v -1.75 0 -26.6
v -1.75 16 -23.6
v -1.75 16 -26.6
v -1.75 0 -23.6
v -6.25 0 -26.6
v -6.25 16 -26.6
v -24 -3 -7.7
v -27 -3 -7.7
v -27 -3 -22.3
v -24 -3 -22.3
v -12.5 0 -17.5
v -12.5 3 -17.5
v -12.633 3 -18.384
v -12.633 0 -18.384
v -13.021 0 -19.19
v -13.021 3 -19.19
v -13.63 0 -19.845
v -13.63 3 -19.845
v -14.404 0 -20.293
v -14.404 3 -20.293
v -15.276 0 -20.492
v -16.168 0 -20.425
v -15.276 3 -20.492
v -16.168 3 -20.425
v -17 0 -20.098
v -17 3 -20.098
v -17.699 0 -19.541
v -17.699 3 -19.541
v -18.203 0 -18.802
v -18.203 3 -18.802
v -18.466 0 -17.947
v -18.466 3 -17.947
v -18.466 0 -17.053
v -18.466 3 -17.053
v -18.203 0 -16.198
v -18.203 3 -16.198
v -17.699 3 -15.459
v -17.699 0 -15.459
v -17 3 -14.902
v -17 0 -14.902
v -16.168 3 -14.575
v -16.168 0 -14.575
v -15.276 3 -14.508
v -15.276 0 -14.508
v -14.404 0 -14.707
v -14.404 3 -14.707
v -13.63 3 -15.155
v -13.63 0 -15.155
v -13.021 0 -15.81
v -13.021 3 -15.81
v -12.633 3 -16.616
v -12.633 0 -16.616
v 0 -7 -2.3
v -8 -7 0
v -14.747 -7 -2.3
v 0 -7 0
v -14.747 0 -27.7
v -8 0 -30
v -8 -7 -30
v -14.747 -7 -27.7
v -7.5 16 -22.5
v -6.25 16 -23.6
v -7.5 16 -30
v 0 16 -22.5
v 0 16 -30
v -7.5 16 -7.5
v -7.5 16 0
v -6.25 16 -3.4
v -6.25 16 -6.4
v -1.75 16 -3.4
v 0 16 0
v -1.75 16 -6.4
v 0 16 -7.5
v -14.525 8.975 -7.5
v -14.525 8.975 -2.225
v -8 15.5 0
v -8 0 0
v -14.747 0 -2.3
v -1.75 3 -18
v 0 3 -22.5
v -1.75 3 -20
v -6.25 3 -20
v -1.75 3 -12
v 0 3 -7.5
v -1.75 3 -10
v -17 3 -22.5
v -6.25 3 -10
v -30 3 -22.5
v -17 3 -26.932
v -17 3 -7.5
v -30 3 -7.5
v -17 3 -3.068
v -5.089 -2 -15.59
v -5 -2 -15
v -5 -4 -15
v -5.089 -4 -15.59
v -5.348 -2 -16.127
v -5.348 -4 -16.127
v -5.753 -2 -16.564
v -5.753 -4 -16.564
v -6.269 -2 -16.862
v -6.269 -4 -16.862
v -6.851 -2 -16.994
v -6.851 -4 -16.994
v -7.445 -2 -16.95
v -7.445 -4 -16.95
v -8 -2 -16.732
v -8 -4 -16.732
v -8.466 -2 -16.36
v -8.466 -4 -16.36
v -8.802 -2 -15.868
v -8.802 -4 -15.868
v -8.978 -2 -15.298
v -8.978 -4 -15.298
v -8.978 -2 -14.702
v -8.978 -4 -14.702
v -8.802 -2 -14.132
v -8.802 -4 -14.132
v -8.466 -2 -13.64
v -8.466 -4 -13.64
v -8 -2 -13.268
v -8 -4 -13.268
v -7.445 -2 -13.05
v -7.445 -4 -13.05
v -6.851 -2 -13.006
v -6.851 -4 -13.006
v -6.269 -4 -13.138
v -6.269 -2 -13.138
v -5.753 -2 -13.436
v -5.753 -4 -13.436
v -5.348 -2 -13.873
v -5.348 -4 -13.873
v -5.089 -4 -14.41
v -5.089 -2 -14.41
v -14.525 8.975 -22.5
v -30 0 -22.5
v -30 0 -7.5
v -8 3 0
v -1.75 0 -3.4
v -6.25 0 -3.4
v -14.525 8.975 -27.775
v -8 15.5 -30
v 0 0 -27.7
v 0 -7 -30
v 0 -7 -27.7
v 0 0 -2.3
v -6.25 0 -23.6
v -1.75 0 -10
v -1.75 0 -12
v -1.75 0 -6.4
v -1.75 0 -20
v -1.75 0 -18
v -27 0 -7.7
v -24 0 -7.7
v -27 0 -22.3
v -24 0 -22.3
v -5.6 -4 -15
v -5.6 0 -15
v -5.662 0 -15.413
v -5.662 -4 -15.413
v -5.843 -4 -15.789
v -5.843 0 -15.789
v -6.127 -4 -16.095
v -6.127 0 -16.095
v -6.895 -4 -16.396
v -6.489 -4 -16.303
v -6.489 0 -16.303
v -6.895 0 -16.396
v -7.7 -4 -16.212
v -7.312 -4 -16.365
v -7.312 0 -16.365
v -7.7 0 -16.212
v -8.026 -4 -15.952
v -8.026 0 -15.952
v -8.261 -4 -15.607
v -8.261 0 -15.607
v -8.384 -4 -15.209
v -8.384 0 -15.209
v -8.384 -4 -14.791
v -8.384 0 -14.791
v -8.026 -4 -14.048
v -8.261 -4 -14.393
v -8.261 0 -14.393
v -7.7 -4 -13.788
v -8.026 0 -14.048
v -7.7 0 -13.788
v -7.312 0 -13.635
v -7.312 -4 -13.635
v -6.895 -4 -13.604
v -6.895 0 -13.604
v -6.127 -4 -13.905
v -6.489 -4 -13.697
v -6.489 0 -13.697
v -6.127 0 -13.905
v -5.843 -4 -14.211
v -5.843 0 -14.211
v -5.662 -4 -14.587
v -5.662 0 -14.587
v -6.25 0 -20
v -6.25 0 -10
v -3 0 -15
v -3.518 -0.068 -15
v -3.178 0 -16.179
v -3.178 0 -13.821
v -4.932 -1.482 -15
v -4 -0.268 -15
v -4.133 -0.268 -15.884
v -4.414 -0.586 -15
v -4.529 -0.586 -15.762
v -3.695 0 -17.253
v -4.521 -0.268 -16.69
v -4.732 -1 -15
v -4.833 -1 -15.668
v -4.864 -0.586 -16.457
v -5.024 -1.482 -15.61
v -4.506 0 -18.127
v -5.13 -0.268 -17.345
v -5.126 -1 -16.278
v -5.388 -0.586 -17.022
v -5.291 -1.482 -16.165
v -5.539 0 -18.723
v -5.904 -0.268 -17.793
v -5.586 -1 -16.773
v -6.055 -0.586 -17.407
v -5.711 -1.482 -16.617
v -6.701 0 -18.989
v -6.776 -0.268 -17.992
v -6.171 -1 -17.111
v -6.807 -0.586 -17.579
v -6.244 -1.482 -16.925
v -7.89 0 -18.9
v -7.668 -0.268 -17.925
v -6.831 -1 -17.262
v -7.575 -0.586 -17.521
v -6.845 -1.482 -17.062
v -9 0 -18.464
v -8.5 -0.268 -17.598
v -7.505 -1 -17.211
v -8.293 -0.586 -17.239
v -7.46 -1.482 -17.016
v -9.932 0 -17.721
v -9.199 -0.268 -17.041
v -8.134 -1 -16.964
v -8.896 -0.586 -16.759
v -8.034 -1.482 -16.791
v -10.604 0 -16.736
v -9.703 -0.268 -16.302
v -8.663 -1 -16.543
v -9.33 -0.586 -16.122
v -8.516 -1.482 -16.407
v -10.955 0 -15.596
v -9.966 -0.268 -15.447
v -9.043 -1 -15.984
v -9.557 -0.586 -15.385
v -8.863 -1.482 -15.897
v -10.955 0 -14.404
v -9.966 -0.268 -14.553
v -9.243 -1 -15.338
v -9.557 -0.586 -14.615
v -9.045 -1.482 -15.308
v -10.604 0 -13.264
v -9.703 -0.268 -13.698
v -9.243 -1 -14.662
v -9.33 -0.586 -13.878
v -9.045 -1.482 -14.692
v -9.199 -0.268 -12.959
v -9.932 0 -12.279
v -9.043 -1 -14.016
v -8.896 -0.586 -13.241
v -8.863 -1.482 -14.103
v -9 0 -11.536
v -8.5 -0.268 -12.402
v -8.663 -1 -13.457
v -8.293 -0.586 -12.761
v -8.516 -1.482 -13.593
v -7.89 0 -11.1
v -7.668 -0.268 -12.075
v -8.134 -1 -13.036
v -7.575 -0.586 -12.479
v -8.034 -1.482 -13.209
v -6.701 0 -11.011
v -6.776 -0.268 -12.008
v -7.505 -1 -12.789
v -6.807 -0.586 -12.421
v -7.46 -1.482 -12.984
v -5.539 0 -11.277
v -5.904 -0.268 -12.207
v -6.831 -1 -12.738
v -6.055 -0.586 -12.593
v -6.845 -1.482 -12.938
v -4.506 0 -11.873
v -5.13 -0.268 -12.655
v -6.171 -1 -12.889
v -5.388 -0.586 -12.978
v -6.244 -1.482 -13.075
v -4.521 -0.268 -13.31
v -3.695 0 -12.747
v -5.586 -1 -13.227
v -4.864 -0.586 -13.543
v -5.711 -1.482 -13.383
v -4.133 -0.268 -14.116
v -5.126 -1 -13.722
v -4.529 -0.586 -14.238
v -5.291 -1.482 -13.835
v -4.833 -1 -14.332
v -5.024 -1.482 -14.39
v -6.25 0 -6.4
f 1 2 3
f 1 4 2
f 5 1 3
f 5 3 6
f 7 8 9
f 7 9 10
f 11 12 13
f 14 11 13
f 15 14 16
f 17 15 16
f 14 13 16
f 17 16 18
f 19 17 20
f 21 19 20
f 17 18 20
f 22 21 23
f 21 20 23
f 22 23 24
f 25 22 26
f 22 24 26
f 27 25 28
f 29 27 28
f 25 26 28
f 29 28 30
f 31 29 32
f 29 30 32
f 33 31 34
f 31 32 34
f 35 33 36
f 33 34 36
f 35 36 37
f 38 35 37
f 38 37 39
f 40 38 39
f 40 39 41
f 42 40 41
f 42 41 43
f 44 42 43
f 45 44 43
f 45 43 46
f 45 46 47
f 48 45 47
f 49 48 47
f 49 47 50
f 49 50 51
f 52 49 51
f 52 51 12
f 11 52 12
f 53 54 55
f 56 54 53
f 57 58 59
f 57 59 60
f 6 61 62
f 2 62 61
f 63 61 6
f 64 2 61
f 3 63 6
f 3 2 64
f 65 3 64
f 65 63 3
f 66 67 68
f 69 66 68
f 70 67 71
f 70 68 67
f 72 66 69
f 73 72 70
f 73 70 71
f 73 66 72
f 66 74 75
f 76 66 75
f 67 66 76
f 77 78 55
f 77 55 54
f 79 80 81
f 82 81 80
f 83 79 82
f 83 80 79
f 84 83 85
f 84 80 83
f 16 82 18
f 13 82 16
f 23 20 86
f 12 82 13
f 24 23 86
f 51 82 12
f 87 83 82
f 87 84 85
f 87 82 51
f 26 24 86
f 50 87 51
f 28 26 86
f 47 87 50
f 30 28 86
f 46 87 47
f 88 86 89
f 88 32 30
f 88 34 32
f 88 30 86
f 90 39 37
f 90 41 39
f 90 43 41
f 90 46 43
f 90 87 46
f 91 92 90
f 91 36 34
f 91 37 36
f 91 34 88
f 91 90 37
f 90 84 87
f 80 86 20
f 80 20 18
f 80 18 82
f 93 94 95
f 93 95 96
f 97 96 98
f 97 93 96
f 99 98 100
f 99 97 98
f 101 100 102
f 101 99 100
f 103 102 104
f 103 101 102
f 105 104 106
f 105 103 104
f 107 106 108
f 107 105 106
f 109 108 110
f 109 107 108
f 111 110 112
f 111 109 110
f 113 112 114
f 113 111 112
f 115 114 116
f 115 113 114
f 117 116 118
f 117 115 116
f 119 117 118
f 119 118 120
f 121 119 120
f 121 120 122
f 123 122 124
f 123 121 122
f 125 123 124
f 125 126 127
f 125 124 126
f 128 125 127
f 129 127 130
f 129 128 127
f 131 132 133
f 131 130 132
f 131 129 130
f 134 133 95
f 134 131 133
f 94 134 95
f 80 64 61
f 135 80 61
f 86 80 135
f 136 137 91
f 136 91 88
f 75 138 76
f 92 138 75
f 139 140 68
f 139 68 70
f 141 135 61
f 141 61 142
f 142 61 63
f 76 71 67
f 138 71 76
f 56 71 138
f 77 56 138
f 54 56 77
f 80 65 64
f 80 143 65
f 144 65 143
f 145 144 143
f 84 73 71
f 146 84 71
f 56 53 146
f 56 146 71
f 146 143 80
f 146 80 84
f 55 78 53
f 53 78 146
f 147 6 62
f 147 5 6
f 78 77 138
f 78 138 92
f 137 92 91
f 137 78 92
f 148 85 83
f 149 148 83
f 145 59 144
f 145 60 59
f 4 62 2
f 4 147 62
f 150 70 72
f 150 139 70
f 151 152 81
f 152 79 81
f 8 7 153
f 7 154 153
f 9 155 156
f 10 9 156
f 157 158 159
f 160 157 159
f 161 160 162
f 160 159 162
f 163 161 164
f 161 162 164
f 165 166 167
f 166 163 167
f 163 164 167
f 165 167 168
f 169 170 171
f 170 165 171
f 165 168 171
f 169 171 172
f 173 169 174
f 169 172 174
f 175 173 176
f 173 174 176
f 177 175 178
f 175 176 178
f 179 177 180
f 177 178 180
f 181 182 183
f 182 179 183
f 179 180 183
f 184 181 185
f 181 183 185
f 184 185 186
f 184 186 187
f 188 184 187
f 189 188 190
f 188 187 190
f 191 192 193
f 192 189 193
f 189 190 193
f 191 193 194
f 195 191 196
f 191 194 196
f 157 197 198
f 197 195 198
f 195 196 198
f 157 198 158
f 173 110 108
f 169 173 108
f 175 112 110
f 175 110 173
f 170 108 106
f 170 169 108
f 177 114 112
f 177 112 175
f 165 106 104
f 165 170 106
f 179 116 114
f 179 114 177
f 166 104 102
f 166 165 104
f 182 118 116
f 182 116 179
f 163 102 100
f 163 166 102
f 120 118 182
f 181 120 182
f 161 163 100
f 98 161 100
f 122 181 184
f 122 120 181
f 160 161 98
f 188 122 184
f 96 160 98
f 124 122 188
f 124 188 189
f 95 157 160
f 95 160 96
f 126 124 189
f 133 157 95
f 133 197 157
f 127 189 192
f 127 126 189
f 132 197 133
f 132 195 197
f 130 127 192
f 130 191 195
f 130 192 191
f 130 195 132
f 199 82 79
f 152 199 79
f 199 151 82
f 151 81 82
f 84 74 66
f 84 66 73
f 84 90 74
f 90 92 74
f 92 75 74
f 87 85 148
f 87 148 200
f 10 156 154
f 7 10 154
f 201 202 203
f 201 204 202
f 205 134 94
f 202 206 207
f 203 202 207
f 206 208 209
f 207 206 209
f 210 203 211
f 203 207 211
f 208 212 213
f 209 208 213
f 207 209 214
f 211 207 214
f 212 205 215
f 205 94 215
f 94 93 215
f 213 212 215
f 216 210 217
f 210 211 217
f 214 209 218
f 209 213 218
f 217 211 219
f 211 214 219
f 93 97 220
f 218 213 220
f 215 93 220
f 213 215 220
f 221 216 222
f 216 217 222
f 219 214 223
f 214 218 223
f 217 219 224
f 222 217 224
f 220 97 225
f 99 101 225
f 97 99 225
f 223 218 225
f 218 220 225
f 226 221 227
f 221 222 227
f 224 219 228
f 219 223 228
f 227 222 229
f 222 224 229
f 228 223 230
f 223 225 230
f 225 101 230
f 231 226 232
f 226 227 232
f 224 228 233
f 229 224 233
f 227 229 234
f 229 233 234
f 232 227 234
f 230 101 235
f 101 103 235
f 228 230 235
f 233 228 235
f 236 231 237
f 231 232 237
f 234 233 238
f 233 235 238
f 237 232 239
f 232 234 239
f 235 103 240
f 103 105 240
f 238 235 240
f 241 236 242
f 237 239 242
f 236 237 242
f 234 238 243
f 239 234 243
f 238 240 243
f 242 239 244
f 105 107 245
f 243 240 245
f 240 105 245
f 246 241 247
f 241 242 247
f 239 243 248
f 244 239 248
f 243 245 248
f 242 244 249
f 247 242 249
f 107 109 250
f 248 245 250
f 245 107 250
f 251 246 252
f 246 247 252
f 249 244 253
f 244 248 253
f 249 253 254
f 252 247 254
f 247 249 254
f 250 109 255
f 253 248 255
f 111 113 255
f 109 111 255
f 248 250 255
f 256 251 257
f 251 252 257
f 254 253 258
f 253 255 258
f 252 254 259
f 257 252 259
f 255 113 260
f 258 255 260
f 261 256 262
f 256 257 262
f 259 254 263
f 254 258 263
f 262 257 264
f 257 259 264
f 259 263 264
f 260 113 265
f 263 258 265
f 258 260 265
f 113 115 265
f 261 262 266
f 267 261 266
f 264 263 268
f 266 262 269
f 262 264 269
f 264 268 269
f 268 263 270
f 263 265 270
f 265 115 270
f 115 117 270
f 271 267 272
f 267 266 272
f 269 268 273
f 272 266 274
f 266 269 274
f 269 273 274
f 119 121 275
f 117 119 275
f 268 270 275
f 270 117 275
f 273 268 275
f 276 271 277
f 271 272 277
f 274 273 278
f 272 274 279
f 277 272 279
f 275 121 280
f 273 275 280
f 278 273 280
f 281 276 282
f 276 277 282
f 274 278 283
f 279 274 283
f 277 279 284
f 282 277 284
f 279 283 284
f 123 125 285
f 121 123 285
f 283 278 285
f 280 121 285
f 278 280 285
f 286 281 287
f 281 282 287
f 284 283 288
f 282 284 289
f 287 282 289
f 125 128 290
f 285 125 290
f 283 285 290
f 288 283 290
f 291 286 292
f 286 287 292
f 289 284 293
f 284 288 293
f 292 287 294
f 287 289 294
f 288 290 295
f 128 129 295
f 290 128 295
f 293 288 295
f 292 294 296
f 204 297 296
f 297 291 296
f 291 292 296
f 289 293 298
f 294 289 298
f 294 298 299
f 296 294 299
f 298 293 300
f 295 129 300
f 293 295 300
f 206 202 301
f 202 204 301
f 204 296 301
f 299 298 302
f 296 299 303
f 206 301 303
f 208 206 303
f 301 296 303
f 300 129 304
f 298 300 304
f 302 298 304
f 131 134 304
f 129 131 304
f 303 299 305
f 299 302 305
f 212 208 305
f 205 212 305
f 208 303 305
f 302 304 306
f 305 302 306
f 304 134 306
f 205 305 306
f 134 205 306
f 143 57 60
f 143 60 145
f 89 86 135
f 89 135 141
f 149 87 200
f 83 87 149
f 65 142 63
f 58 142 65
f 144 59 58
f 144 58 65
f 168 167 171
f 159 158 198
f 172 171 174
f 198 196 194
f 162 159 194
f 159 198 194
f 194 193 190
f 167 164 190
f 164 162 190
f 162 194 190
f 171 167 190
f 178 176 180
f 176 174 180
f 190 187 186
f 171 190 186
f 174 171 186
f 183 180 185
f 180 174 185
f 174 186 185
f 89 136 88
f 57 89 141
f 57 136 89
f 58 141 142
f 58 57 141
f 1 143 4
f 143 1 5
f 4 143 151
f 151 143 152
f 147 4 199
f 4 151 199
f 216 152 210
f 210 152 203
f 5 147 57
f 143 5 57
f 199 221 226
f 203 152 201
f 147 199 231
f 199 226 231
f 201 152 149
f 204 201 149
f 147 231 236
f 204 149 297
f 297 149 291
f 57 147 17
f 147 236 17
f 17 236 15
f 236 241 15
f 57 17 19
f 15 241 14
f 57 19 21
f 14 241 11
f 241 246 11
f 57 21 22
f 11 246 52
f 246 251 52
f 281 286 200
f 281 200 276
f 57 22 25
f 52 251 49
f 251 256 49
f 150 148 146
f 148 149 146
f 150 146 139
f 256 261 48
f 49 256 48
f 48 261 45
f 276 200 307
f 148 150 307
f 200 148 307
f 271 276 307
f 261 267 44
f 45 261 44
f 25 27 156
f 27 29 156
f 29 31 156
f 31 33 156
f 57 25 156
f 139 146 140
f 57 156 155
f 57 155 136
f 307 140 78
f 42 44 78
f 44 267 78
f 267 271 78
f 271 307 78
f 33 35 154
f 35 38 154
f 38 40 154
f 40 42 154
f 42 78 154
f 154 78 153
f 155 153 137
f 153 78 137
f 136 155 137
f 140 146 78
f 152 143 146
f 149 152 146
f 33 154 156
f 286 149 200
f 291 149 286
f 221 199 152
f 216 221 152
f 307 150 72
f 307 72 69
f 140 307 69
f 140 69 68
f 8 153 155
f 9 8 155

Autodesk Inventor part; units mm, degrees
ref_plane "YZ Plane" through (0, 0, 0) normal (1, 0, 0) x (0, 1, 0)
ref_plane "XZ Plane" through (0, 0, 0) normal (0, 1, 0) x (-1, 0, 0)
ref_plane "XY Plane" through (0, 0, 0) normal (0, 0, 1) x (1, 0, 0)
sketch "Sketch1" plane through (0, 0, 0) normal (0, 1, 0) x (-1, 0, 0)
  line L0 (0, 0) -> (8, 0)
  line L1 (8, -30) -> (0, -30)
  line L2 (0, -30) -> (0, 0)
  line L3 (6.25, -3.4) -> (1.75, -3.4)
  line L4 (1.75, -3.4) -> (1.75, -6.4)
  line L5 (1.75, -6.4) -> (6.25, -6.4)
  line L6 (6.25, -6.4) -> (6.25, -3.4)
  line L7 (6.25, -23.6) -> (1.75, -23.6)
  line L8 (1.75, -23.6) -> (1.75, -26.6)
  line L9 (1.75, -26.6) -> (6.25, -26.6)
  line L10 (6.25, -26.6) -> (6.25, -23.6)
  line L11 (8, 0) -> (30, -7.5)
  line L12 (30, -7.5) -> (30, -22.5)
  line L13 (30, -22.5) -> (8, -30)
  dimension "d0" = 30
  dimension "d1" = 8
  dimension "d2" = 4.5
  dimension "d3" = 3
  dimension "d4" = 3
  dimension "d5" = 17.2
  dimension "d6" = 3.4
  dimension "d7" = 1.75
  dimension "d8" = 15
  dimension "d9" = 7.5
  dimension "d10" = 22
  dimension "d11" = 22
extrude "Extrusion1" add sketch "Sketch1" along normal blind 3
sketch "Sketch2" plane through (0, 0, 0) normal (0, -1, 0) x (1, 0, 0)
  line L0 (0, -30) -> (-8, -30) projected
  line L1 (0, -30) -> (-8, -30)
  line L2 (-8, -30) -> (-14.7467, -27.7)
  line L3 (-8, -30) -> (-30, -22.5) projected
  line L4 (-14.7467, -27.7) -> (0, -27.7)
  line L5 (0, 0) -> (0, -30) projected
  line L6 (0, -27.7) -> (0, -30)
  line L7 (-14.7467, -2.3) -> (-8, 0)
  line L8 (-8, 0) -> (0, 0)
  line L9 (-14.7467, -2.3) -> (0, -2.3)
  line L10 (0, 0) -> (0, -2.3)
  dimension "d14" = 2.3
  dimension "d15" = 2.3
  dimension "d26" = 14.7467
extrude "Extrusion2" add sketch "Sketch2" along normal blind 7
sketch "Sketch3" plane through (0, 0, 0) normal (0, -1, 0) x (1, 0, 0)
  line L0 (-27, -22.3) -> (-24, -22.3)
  line L1 (-24, -22.3) -> (-24, -7.7)
  line L2 (-24, -7.7) -> (-27, -7.7)
  line L3 (-27, -7.7) -> (-27, -22.3)
  line L4 (0, -2.3) -> (0, -27.7) projected
  circle A0 centre (-7, -15) radius 1.4
  circle A1 centre (-7, -15) radius 2
  line L5 (-8, -30) -> (0, -30) projected
  point P0 (0, 0)
  point P1 (-30, -7.5)
  point P2 (-30, -22.5)
  dimension "d27" = 3
  dimension "d28" = 24
  dimension "d29" = 14.6
  dimension "d30" = 0.2
  dimension "d31" = 2.8
  dimension "d32" = 4
  dimension "d33" = 7
  dimension "d34" = 15
extrude "Extrusion3" add sketch "Sketch3" along normal blind 4
fillet "Fillet1" radius 2 1 edges at (-9, 0, -15)
sketch "Sketch4" plane through (0, 3, 0) normal (0, 1, 0) x (1, 0, 0)
  circle A0 centre (-7, 15) radius 2 projected
  circle A1 centre (-7, 15) radius 1.4 projected
  circle A2 centre (-7, 15) radius 4 projected
  line L0 (-1.75, 10) -> (-6.25, 10)
  line L1 (-6.25, 10) -> (-1.75, 12)
  line L2 (-1.75, 10) -> (-1.75, 12)
  line L3 (-1.75, 18) -> (-1.75, 20)
  line L4 (-1.75, 20) -> (-6.25, 20)
  line L5 (-6.25, 20) -> (-1.75, 18)
  point P0 (0, 0)
  point P1 (-6.25, 6.4)
  point P2 (-1.75, 6.4)
  point P3 (-6.25, 23.6)
  point P4 (-1.75, 23.6)
  dimension "d38" = 3
  dimension "d39" = 2
  dimension "d40" = 2
  dimension "d41" = 3
extrude "Extrusion4" cut sketch "Sketch4" against normal blind 5 contours L0 L1 L2 | L5 L4 L3
sketch "Sketch5" plane through (0, 3, 0) normal (0, 1, 0) x (1, 0, 0)
  circle A0 centre (-15.5, 17.5) radius 3
  line L0 (0, 0) -> (0, 30) projected
  point P0 (-30, 22.5)
  dimension "d44" = 6
  dimension "d45" = 15.5
  dimension "d46" = 5
extrude "Extrusion5" cut sketch "Sketch5" against normal blind 5
sketch "Sketch6" plane through (0, 3, 0) normal (0, 1, 0) x (1, 0, 0)
  line L0 (-6.25, 26.6) -> (-1.75, 26.6) projected
  line L1 (-1.75, 23.6) -> (-6.25, 23.6) projected
  line L2 (-6.25, 26.6) -> (-1.75, 26.6)
  line L3 (-1.75, 26.6) -> (-1.75, 23.6)
  line L4 (-1.75, 23.6) -> (-6.25, 23.6)
  line L5 (-6.25, 23.6) -> (-6.25, 26.6)
  line L6 (-6.25, 6.4) -> (-1.75, 6.4) projected
  line L7 (-6.25, 6.4) -> (-1.75, 6.4)
  line L8 (-1.75, 6.4) -> (-1.75, 3.4)
  line L9 (-1.75, 3.4) -> (-6.25, 3.4)
  line L10 (-6.25, 3.4) -> (-6.25, 6.4)
  line L11 (-8, 0) -> (0, 0) projected
  line L12 (0, 0) -> (-8, 0)
  line L13 (0, 0) -> (0, 30) projected
  line L14 (0, 7.5) -> (0, 0)
  line L15 (0, 30) -> (-8, 30)
  line L16 (0, 22.5) -> (0, 30)
  line L17 (-8, 30) -> (-30, 22.5) projected
  line L18 (-8, 30) -> (-17, 26.9318)
  line L19 (0, 22.5) -> (-17, 22.5)
  line L20 (-17, 26.9318) -> (-17, 22.5)
  line L21 (-8, 0) -> (-17, 3.0682)
  line L22 (-30, 7.5) -> (-8, 0) projected
  line L23 (-17, 3.0682) -> (-17, 7.5)
  line L24 (-17, 7.5) -> (0, 7.5)
  dimension "d52" = 3
  dimension "d55" = 17
  dimension "d56" = 1.1
  dimension "d57" = 17
  dimension "d58" = 1.1
extrude "Extrusion7" add sketch "Sketch6" along normal blind 13
chamfer "Chamfer1" distance 9.5 angle 45 2 edges at (-17, 16, -24.7159) (-17, 16, -5.2841)
chamfer "Chamfer2" distance 3.5 angle 45 2 edges at (-17, 6.5, -5.2841) (-17, 6.5, -24.7159)
sketch "Sketch9" plane through (0, -4, 0) normal (0, -1, 0) x (1, 0, 0)
  line L0 (-27, -22.3) -> (-24, -22.3) projected
  line L1 (-24, -22.3) -> (-24, -7.7) projected
  line L2 (-27, -22.3) -> (-24, -22.3)
  line L3 (-24, -22.3) -> (-24, -7.7)
  line L4 (-24, -7.7) -> (-27, -7.7)
  line L5 (-27, -7.7) -> (-27, -22.3)
  point P0 (0, 0)
extrude "Extrusion10" cut sketch "Sketch9" against normal blind 1
properties part number "IRMount_top"
